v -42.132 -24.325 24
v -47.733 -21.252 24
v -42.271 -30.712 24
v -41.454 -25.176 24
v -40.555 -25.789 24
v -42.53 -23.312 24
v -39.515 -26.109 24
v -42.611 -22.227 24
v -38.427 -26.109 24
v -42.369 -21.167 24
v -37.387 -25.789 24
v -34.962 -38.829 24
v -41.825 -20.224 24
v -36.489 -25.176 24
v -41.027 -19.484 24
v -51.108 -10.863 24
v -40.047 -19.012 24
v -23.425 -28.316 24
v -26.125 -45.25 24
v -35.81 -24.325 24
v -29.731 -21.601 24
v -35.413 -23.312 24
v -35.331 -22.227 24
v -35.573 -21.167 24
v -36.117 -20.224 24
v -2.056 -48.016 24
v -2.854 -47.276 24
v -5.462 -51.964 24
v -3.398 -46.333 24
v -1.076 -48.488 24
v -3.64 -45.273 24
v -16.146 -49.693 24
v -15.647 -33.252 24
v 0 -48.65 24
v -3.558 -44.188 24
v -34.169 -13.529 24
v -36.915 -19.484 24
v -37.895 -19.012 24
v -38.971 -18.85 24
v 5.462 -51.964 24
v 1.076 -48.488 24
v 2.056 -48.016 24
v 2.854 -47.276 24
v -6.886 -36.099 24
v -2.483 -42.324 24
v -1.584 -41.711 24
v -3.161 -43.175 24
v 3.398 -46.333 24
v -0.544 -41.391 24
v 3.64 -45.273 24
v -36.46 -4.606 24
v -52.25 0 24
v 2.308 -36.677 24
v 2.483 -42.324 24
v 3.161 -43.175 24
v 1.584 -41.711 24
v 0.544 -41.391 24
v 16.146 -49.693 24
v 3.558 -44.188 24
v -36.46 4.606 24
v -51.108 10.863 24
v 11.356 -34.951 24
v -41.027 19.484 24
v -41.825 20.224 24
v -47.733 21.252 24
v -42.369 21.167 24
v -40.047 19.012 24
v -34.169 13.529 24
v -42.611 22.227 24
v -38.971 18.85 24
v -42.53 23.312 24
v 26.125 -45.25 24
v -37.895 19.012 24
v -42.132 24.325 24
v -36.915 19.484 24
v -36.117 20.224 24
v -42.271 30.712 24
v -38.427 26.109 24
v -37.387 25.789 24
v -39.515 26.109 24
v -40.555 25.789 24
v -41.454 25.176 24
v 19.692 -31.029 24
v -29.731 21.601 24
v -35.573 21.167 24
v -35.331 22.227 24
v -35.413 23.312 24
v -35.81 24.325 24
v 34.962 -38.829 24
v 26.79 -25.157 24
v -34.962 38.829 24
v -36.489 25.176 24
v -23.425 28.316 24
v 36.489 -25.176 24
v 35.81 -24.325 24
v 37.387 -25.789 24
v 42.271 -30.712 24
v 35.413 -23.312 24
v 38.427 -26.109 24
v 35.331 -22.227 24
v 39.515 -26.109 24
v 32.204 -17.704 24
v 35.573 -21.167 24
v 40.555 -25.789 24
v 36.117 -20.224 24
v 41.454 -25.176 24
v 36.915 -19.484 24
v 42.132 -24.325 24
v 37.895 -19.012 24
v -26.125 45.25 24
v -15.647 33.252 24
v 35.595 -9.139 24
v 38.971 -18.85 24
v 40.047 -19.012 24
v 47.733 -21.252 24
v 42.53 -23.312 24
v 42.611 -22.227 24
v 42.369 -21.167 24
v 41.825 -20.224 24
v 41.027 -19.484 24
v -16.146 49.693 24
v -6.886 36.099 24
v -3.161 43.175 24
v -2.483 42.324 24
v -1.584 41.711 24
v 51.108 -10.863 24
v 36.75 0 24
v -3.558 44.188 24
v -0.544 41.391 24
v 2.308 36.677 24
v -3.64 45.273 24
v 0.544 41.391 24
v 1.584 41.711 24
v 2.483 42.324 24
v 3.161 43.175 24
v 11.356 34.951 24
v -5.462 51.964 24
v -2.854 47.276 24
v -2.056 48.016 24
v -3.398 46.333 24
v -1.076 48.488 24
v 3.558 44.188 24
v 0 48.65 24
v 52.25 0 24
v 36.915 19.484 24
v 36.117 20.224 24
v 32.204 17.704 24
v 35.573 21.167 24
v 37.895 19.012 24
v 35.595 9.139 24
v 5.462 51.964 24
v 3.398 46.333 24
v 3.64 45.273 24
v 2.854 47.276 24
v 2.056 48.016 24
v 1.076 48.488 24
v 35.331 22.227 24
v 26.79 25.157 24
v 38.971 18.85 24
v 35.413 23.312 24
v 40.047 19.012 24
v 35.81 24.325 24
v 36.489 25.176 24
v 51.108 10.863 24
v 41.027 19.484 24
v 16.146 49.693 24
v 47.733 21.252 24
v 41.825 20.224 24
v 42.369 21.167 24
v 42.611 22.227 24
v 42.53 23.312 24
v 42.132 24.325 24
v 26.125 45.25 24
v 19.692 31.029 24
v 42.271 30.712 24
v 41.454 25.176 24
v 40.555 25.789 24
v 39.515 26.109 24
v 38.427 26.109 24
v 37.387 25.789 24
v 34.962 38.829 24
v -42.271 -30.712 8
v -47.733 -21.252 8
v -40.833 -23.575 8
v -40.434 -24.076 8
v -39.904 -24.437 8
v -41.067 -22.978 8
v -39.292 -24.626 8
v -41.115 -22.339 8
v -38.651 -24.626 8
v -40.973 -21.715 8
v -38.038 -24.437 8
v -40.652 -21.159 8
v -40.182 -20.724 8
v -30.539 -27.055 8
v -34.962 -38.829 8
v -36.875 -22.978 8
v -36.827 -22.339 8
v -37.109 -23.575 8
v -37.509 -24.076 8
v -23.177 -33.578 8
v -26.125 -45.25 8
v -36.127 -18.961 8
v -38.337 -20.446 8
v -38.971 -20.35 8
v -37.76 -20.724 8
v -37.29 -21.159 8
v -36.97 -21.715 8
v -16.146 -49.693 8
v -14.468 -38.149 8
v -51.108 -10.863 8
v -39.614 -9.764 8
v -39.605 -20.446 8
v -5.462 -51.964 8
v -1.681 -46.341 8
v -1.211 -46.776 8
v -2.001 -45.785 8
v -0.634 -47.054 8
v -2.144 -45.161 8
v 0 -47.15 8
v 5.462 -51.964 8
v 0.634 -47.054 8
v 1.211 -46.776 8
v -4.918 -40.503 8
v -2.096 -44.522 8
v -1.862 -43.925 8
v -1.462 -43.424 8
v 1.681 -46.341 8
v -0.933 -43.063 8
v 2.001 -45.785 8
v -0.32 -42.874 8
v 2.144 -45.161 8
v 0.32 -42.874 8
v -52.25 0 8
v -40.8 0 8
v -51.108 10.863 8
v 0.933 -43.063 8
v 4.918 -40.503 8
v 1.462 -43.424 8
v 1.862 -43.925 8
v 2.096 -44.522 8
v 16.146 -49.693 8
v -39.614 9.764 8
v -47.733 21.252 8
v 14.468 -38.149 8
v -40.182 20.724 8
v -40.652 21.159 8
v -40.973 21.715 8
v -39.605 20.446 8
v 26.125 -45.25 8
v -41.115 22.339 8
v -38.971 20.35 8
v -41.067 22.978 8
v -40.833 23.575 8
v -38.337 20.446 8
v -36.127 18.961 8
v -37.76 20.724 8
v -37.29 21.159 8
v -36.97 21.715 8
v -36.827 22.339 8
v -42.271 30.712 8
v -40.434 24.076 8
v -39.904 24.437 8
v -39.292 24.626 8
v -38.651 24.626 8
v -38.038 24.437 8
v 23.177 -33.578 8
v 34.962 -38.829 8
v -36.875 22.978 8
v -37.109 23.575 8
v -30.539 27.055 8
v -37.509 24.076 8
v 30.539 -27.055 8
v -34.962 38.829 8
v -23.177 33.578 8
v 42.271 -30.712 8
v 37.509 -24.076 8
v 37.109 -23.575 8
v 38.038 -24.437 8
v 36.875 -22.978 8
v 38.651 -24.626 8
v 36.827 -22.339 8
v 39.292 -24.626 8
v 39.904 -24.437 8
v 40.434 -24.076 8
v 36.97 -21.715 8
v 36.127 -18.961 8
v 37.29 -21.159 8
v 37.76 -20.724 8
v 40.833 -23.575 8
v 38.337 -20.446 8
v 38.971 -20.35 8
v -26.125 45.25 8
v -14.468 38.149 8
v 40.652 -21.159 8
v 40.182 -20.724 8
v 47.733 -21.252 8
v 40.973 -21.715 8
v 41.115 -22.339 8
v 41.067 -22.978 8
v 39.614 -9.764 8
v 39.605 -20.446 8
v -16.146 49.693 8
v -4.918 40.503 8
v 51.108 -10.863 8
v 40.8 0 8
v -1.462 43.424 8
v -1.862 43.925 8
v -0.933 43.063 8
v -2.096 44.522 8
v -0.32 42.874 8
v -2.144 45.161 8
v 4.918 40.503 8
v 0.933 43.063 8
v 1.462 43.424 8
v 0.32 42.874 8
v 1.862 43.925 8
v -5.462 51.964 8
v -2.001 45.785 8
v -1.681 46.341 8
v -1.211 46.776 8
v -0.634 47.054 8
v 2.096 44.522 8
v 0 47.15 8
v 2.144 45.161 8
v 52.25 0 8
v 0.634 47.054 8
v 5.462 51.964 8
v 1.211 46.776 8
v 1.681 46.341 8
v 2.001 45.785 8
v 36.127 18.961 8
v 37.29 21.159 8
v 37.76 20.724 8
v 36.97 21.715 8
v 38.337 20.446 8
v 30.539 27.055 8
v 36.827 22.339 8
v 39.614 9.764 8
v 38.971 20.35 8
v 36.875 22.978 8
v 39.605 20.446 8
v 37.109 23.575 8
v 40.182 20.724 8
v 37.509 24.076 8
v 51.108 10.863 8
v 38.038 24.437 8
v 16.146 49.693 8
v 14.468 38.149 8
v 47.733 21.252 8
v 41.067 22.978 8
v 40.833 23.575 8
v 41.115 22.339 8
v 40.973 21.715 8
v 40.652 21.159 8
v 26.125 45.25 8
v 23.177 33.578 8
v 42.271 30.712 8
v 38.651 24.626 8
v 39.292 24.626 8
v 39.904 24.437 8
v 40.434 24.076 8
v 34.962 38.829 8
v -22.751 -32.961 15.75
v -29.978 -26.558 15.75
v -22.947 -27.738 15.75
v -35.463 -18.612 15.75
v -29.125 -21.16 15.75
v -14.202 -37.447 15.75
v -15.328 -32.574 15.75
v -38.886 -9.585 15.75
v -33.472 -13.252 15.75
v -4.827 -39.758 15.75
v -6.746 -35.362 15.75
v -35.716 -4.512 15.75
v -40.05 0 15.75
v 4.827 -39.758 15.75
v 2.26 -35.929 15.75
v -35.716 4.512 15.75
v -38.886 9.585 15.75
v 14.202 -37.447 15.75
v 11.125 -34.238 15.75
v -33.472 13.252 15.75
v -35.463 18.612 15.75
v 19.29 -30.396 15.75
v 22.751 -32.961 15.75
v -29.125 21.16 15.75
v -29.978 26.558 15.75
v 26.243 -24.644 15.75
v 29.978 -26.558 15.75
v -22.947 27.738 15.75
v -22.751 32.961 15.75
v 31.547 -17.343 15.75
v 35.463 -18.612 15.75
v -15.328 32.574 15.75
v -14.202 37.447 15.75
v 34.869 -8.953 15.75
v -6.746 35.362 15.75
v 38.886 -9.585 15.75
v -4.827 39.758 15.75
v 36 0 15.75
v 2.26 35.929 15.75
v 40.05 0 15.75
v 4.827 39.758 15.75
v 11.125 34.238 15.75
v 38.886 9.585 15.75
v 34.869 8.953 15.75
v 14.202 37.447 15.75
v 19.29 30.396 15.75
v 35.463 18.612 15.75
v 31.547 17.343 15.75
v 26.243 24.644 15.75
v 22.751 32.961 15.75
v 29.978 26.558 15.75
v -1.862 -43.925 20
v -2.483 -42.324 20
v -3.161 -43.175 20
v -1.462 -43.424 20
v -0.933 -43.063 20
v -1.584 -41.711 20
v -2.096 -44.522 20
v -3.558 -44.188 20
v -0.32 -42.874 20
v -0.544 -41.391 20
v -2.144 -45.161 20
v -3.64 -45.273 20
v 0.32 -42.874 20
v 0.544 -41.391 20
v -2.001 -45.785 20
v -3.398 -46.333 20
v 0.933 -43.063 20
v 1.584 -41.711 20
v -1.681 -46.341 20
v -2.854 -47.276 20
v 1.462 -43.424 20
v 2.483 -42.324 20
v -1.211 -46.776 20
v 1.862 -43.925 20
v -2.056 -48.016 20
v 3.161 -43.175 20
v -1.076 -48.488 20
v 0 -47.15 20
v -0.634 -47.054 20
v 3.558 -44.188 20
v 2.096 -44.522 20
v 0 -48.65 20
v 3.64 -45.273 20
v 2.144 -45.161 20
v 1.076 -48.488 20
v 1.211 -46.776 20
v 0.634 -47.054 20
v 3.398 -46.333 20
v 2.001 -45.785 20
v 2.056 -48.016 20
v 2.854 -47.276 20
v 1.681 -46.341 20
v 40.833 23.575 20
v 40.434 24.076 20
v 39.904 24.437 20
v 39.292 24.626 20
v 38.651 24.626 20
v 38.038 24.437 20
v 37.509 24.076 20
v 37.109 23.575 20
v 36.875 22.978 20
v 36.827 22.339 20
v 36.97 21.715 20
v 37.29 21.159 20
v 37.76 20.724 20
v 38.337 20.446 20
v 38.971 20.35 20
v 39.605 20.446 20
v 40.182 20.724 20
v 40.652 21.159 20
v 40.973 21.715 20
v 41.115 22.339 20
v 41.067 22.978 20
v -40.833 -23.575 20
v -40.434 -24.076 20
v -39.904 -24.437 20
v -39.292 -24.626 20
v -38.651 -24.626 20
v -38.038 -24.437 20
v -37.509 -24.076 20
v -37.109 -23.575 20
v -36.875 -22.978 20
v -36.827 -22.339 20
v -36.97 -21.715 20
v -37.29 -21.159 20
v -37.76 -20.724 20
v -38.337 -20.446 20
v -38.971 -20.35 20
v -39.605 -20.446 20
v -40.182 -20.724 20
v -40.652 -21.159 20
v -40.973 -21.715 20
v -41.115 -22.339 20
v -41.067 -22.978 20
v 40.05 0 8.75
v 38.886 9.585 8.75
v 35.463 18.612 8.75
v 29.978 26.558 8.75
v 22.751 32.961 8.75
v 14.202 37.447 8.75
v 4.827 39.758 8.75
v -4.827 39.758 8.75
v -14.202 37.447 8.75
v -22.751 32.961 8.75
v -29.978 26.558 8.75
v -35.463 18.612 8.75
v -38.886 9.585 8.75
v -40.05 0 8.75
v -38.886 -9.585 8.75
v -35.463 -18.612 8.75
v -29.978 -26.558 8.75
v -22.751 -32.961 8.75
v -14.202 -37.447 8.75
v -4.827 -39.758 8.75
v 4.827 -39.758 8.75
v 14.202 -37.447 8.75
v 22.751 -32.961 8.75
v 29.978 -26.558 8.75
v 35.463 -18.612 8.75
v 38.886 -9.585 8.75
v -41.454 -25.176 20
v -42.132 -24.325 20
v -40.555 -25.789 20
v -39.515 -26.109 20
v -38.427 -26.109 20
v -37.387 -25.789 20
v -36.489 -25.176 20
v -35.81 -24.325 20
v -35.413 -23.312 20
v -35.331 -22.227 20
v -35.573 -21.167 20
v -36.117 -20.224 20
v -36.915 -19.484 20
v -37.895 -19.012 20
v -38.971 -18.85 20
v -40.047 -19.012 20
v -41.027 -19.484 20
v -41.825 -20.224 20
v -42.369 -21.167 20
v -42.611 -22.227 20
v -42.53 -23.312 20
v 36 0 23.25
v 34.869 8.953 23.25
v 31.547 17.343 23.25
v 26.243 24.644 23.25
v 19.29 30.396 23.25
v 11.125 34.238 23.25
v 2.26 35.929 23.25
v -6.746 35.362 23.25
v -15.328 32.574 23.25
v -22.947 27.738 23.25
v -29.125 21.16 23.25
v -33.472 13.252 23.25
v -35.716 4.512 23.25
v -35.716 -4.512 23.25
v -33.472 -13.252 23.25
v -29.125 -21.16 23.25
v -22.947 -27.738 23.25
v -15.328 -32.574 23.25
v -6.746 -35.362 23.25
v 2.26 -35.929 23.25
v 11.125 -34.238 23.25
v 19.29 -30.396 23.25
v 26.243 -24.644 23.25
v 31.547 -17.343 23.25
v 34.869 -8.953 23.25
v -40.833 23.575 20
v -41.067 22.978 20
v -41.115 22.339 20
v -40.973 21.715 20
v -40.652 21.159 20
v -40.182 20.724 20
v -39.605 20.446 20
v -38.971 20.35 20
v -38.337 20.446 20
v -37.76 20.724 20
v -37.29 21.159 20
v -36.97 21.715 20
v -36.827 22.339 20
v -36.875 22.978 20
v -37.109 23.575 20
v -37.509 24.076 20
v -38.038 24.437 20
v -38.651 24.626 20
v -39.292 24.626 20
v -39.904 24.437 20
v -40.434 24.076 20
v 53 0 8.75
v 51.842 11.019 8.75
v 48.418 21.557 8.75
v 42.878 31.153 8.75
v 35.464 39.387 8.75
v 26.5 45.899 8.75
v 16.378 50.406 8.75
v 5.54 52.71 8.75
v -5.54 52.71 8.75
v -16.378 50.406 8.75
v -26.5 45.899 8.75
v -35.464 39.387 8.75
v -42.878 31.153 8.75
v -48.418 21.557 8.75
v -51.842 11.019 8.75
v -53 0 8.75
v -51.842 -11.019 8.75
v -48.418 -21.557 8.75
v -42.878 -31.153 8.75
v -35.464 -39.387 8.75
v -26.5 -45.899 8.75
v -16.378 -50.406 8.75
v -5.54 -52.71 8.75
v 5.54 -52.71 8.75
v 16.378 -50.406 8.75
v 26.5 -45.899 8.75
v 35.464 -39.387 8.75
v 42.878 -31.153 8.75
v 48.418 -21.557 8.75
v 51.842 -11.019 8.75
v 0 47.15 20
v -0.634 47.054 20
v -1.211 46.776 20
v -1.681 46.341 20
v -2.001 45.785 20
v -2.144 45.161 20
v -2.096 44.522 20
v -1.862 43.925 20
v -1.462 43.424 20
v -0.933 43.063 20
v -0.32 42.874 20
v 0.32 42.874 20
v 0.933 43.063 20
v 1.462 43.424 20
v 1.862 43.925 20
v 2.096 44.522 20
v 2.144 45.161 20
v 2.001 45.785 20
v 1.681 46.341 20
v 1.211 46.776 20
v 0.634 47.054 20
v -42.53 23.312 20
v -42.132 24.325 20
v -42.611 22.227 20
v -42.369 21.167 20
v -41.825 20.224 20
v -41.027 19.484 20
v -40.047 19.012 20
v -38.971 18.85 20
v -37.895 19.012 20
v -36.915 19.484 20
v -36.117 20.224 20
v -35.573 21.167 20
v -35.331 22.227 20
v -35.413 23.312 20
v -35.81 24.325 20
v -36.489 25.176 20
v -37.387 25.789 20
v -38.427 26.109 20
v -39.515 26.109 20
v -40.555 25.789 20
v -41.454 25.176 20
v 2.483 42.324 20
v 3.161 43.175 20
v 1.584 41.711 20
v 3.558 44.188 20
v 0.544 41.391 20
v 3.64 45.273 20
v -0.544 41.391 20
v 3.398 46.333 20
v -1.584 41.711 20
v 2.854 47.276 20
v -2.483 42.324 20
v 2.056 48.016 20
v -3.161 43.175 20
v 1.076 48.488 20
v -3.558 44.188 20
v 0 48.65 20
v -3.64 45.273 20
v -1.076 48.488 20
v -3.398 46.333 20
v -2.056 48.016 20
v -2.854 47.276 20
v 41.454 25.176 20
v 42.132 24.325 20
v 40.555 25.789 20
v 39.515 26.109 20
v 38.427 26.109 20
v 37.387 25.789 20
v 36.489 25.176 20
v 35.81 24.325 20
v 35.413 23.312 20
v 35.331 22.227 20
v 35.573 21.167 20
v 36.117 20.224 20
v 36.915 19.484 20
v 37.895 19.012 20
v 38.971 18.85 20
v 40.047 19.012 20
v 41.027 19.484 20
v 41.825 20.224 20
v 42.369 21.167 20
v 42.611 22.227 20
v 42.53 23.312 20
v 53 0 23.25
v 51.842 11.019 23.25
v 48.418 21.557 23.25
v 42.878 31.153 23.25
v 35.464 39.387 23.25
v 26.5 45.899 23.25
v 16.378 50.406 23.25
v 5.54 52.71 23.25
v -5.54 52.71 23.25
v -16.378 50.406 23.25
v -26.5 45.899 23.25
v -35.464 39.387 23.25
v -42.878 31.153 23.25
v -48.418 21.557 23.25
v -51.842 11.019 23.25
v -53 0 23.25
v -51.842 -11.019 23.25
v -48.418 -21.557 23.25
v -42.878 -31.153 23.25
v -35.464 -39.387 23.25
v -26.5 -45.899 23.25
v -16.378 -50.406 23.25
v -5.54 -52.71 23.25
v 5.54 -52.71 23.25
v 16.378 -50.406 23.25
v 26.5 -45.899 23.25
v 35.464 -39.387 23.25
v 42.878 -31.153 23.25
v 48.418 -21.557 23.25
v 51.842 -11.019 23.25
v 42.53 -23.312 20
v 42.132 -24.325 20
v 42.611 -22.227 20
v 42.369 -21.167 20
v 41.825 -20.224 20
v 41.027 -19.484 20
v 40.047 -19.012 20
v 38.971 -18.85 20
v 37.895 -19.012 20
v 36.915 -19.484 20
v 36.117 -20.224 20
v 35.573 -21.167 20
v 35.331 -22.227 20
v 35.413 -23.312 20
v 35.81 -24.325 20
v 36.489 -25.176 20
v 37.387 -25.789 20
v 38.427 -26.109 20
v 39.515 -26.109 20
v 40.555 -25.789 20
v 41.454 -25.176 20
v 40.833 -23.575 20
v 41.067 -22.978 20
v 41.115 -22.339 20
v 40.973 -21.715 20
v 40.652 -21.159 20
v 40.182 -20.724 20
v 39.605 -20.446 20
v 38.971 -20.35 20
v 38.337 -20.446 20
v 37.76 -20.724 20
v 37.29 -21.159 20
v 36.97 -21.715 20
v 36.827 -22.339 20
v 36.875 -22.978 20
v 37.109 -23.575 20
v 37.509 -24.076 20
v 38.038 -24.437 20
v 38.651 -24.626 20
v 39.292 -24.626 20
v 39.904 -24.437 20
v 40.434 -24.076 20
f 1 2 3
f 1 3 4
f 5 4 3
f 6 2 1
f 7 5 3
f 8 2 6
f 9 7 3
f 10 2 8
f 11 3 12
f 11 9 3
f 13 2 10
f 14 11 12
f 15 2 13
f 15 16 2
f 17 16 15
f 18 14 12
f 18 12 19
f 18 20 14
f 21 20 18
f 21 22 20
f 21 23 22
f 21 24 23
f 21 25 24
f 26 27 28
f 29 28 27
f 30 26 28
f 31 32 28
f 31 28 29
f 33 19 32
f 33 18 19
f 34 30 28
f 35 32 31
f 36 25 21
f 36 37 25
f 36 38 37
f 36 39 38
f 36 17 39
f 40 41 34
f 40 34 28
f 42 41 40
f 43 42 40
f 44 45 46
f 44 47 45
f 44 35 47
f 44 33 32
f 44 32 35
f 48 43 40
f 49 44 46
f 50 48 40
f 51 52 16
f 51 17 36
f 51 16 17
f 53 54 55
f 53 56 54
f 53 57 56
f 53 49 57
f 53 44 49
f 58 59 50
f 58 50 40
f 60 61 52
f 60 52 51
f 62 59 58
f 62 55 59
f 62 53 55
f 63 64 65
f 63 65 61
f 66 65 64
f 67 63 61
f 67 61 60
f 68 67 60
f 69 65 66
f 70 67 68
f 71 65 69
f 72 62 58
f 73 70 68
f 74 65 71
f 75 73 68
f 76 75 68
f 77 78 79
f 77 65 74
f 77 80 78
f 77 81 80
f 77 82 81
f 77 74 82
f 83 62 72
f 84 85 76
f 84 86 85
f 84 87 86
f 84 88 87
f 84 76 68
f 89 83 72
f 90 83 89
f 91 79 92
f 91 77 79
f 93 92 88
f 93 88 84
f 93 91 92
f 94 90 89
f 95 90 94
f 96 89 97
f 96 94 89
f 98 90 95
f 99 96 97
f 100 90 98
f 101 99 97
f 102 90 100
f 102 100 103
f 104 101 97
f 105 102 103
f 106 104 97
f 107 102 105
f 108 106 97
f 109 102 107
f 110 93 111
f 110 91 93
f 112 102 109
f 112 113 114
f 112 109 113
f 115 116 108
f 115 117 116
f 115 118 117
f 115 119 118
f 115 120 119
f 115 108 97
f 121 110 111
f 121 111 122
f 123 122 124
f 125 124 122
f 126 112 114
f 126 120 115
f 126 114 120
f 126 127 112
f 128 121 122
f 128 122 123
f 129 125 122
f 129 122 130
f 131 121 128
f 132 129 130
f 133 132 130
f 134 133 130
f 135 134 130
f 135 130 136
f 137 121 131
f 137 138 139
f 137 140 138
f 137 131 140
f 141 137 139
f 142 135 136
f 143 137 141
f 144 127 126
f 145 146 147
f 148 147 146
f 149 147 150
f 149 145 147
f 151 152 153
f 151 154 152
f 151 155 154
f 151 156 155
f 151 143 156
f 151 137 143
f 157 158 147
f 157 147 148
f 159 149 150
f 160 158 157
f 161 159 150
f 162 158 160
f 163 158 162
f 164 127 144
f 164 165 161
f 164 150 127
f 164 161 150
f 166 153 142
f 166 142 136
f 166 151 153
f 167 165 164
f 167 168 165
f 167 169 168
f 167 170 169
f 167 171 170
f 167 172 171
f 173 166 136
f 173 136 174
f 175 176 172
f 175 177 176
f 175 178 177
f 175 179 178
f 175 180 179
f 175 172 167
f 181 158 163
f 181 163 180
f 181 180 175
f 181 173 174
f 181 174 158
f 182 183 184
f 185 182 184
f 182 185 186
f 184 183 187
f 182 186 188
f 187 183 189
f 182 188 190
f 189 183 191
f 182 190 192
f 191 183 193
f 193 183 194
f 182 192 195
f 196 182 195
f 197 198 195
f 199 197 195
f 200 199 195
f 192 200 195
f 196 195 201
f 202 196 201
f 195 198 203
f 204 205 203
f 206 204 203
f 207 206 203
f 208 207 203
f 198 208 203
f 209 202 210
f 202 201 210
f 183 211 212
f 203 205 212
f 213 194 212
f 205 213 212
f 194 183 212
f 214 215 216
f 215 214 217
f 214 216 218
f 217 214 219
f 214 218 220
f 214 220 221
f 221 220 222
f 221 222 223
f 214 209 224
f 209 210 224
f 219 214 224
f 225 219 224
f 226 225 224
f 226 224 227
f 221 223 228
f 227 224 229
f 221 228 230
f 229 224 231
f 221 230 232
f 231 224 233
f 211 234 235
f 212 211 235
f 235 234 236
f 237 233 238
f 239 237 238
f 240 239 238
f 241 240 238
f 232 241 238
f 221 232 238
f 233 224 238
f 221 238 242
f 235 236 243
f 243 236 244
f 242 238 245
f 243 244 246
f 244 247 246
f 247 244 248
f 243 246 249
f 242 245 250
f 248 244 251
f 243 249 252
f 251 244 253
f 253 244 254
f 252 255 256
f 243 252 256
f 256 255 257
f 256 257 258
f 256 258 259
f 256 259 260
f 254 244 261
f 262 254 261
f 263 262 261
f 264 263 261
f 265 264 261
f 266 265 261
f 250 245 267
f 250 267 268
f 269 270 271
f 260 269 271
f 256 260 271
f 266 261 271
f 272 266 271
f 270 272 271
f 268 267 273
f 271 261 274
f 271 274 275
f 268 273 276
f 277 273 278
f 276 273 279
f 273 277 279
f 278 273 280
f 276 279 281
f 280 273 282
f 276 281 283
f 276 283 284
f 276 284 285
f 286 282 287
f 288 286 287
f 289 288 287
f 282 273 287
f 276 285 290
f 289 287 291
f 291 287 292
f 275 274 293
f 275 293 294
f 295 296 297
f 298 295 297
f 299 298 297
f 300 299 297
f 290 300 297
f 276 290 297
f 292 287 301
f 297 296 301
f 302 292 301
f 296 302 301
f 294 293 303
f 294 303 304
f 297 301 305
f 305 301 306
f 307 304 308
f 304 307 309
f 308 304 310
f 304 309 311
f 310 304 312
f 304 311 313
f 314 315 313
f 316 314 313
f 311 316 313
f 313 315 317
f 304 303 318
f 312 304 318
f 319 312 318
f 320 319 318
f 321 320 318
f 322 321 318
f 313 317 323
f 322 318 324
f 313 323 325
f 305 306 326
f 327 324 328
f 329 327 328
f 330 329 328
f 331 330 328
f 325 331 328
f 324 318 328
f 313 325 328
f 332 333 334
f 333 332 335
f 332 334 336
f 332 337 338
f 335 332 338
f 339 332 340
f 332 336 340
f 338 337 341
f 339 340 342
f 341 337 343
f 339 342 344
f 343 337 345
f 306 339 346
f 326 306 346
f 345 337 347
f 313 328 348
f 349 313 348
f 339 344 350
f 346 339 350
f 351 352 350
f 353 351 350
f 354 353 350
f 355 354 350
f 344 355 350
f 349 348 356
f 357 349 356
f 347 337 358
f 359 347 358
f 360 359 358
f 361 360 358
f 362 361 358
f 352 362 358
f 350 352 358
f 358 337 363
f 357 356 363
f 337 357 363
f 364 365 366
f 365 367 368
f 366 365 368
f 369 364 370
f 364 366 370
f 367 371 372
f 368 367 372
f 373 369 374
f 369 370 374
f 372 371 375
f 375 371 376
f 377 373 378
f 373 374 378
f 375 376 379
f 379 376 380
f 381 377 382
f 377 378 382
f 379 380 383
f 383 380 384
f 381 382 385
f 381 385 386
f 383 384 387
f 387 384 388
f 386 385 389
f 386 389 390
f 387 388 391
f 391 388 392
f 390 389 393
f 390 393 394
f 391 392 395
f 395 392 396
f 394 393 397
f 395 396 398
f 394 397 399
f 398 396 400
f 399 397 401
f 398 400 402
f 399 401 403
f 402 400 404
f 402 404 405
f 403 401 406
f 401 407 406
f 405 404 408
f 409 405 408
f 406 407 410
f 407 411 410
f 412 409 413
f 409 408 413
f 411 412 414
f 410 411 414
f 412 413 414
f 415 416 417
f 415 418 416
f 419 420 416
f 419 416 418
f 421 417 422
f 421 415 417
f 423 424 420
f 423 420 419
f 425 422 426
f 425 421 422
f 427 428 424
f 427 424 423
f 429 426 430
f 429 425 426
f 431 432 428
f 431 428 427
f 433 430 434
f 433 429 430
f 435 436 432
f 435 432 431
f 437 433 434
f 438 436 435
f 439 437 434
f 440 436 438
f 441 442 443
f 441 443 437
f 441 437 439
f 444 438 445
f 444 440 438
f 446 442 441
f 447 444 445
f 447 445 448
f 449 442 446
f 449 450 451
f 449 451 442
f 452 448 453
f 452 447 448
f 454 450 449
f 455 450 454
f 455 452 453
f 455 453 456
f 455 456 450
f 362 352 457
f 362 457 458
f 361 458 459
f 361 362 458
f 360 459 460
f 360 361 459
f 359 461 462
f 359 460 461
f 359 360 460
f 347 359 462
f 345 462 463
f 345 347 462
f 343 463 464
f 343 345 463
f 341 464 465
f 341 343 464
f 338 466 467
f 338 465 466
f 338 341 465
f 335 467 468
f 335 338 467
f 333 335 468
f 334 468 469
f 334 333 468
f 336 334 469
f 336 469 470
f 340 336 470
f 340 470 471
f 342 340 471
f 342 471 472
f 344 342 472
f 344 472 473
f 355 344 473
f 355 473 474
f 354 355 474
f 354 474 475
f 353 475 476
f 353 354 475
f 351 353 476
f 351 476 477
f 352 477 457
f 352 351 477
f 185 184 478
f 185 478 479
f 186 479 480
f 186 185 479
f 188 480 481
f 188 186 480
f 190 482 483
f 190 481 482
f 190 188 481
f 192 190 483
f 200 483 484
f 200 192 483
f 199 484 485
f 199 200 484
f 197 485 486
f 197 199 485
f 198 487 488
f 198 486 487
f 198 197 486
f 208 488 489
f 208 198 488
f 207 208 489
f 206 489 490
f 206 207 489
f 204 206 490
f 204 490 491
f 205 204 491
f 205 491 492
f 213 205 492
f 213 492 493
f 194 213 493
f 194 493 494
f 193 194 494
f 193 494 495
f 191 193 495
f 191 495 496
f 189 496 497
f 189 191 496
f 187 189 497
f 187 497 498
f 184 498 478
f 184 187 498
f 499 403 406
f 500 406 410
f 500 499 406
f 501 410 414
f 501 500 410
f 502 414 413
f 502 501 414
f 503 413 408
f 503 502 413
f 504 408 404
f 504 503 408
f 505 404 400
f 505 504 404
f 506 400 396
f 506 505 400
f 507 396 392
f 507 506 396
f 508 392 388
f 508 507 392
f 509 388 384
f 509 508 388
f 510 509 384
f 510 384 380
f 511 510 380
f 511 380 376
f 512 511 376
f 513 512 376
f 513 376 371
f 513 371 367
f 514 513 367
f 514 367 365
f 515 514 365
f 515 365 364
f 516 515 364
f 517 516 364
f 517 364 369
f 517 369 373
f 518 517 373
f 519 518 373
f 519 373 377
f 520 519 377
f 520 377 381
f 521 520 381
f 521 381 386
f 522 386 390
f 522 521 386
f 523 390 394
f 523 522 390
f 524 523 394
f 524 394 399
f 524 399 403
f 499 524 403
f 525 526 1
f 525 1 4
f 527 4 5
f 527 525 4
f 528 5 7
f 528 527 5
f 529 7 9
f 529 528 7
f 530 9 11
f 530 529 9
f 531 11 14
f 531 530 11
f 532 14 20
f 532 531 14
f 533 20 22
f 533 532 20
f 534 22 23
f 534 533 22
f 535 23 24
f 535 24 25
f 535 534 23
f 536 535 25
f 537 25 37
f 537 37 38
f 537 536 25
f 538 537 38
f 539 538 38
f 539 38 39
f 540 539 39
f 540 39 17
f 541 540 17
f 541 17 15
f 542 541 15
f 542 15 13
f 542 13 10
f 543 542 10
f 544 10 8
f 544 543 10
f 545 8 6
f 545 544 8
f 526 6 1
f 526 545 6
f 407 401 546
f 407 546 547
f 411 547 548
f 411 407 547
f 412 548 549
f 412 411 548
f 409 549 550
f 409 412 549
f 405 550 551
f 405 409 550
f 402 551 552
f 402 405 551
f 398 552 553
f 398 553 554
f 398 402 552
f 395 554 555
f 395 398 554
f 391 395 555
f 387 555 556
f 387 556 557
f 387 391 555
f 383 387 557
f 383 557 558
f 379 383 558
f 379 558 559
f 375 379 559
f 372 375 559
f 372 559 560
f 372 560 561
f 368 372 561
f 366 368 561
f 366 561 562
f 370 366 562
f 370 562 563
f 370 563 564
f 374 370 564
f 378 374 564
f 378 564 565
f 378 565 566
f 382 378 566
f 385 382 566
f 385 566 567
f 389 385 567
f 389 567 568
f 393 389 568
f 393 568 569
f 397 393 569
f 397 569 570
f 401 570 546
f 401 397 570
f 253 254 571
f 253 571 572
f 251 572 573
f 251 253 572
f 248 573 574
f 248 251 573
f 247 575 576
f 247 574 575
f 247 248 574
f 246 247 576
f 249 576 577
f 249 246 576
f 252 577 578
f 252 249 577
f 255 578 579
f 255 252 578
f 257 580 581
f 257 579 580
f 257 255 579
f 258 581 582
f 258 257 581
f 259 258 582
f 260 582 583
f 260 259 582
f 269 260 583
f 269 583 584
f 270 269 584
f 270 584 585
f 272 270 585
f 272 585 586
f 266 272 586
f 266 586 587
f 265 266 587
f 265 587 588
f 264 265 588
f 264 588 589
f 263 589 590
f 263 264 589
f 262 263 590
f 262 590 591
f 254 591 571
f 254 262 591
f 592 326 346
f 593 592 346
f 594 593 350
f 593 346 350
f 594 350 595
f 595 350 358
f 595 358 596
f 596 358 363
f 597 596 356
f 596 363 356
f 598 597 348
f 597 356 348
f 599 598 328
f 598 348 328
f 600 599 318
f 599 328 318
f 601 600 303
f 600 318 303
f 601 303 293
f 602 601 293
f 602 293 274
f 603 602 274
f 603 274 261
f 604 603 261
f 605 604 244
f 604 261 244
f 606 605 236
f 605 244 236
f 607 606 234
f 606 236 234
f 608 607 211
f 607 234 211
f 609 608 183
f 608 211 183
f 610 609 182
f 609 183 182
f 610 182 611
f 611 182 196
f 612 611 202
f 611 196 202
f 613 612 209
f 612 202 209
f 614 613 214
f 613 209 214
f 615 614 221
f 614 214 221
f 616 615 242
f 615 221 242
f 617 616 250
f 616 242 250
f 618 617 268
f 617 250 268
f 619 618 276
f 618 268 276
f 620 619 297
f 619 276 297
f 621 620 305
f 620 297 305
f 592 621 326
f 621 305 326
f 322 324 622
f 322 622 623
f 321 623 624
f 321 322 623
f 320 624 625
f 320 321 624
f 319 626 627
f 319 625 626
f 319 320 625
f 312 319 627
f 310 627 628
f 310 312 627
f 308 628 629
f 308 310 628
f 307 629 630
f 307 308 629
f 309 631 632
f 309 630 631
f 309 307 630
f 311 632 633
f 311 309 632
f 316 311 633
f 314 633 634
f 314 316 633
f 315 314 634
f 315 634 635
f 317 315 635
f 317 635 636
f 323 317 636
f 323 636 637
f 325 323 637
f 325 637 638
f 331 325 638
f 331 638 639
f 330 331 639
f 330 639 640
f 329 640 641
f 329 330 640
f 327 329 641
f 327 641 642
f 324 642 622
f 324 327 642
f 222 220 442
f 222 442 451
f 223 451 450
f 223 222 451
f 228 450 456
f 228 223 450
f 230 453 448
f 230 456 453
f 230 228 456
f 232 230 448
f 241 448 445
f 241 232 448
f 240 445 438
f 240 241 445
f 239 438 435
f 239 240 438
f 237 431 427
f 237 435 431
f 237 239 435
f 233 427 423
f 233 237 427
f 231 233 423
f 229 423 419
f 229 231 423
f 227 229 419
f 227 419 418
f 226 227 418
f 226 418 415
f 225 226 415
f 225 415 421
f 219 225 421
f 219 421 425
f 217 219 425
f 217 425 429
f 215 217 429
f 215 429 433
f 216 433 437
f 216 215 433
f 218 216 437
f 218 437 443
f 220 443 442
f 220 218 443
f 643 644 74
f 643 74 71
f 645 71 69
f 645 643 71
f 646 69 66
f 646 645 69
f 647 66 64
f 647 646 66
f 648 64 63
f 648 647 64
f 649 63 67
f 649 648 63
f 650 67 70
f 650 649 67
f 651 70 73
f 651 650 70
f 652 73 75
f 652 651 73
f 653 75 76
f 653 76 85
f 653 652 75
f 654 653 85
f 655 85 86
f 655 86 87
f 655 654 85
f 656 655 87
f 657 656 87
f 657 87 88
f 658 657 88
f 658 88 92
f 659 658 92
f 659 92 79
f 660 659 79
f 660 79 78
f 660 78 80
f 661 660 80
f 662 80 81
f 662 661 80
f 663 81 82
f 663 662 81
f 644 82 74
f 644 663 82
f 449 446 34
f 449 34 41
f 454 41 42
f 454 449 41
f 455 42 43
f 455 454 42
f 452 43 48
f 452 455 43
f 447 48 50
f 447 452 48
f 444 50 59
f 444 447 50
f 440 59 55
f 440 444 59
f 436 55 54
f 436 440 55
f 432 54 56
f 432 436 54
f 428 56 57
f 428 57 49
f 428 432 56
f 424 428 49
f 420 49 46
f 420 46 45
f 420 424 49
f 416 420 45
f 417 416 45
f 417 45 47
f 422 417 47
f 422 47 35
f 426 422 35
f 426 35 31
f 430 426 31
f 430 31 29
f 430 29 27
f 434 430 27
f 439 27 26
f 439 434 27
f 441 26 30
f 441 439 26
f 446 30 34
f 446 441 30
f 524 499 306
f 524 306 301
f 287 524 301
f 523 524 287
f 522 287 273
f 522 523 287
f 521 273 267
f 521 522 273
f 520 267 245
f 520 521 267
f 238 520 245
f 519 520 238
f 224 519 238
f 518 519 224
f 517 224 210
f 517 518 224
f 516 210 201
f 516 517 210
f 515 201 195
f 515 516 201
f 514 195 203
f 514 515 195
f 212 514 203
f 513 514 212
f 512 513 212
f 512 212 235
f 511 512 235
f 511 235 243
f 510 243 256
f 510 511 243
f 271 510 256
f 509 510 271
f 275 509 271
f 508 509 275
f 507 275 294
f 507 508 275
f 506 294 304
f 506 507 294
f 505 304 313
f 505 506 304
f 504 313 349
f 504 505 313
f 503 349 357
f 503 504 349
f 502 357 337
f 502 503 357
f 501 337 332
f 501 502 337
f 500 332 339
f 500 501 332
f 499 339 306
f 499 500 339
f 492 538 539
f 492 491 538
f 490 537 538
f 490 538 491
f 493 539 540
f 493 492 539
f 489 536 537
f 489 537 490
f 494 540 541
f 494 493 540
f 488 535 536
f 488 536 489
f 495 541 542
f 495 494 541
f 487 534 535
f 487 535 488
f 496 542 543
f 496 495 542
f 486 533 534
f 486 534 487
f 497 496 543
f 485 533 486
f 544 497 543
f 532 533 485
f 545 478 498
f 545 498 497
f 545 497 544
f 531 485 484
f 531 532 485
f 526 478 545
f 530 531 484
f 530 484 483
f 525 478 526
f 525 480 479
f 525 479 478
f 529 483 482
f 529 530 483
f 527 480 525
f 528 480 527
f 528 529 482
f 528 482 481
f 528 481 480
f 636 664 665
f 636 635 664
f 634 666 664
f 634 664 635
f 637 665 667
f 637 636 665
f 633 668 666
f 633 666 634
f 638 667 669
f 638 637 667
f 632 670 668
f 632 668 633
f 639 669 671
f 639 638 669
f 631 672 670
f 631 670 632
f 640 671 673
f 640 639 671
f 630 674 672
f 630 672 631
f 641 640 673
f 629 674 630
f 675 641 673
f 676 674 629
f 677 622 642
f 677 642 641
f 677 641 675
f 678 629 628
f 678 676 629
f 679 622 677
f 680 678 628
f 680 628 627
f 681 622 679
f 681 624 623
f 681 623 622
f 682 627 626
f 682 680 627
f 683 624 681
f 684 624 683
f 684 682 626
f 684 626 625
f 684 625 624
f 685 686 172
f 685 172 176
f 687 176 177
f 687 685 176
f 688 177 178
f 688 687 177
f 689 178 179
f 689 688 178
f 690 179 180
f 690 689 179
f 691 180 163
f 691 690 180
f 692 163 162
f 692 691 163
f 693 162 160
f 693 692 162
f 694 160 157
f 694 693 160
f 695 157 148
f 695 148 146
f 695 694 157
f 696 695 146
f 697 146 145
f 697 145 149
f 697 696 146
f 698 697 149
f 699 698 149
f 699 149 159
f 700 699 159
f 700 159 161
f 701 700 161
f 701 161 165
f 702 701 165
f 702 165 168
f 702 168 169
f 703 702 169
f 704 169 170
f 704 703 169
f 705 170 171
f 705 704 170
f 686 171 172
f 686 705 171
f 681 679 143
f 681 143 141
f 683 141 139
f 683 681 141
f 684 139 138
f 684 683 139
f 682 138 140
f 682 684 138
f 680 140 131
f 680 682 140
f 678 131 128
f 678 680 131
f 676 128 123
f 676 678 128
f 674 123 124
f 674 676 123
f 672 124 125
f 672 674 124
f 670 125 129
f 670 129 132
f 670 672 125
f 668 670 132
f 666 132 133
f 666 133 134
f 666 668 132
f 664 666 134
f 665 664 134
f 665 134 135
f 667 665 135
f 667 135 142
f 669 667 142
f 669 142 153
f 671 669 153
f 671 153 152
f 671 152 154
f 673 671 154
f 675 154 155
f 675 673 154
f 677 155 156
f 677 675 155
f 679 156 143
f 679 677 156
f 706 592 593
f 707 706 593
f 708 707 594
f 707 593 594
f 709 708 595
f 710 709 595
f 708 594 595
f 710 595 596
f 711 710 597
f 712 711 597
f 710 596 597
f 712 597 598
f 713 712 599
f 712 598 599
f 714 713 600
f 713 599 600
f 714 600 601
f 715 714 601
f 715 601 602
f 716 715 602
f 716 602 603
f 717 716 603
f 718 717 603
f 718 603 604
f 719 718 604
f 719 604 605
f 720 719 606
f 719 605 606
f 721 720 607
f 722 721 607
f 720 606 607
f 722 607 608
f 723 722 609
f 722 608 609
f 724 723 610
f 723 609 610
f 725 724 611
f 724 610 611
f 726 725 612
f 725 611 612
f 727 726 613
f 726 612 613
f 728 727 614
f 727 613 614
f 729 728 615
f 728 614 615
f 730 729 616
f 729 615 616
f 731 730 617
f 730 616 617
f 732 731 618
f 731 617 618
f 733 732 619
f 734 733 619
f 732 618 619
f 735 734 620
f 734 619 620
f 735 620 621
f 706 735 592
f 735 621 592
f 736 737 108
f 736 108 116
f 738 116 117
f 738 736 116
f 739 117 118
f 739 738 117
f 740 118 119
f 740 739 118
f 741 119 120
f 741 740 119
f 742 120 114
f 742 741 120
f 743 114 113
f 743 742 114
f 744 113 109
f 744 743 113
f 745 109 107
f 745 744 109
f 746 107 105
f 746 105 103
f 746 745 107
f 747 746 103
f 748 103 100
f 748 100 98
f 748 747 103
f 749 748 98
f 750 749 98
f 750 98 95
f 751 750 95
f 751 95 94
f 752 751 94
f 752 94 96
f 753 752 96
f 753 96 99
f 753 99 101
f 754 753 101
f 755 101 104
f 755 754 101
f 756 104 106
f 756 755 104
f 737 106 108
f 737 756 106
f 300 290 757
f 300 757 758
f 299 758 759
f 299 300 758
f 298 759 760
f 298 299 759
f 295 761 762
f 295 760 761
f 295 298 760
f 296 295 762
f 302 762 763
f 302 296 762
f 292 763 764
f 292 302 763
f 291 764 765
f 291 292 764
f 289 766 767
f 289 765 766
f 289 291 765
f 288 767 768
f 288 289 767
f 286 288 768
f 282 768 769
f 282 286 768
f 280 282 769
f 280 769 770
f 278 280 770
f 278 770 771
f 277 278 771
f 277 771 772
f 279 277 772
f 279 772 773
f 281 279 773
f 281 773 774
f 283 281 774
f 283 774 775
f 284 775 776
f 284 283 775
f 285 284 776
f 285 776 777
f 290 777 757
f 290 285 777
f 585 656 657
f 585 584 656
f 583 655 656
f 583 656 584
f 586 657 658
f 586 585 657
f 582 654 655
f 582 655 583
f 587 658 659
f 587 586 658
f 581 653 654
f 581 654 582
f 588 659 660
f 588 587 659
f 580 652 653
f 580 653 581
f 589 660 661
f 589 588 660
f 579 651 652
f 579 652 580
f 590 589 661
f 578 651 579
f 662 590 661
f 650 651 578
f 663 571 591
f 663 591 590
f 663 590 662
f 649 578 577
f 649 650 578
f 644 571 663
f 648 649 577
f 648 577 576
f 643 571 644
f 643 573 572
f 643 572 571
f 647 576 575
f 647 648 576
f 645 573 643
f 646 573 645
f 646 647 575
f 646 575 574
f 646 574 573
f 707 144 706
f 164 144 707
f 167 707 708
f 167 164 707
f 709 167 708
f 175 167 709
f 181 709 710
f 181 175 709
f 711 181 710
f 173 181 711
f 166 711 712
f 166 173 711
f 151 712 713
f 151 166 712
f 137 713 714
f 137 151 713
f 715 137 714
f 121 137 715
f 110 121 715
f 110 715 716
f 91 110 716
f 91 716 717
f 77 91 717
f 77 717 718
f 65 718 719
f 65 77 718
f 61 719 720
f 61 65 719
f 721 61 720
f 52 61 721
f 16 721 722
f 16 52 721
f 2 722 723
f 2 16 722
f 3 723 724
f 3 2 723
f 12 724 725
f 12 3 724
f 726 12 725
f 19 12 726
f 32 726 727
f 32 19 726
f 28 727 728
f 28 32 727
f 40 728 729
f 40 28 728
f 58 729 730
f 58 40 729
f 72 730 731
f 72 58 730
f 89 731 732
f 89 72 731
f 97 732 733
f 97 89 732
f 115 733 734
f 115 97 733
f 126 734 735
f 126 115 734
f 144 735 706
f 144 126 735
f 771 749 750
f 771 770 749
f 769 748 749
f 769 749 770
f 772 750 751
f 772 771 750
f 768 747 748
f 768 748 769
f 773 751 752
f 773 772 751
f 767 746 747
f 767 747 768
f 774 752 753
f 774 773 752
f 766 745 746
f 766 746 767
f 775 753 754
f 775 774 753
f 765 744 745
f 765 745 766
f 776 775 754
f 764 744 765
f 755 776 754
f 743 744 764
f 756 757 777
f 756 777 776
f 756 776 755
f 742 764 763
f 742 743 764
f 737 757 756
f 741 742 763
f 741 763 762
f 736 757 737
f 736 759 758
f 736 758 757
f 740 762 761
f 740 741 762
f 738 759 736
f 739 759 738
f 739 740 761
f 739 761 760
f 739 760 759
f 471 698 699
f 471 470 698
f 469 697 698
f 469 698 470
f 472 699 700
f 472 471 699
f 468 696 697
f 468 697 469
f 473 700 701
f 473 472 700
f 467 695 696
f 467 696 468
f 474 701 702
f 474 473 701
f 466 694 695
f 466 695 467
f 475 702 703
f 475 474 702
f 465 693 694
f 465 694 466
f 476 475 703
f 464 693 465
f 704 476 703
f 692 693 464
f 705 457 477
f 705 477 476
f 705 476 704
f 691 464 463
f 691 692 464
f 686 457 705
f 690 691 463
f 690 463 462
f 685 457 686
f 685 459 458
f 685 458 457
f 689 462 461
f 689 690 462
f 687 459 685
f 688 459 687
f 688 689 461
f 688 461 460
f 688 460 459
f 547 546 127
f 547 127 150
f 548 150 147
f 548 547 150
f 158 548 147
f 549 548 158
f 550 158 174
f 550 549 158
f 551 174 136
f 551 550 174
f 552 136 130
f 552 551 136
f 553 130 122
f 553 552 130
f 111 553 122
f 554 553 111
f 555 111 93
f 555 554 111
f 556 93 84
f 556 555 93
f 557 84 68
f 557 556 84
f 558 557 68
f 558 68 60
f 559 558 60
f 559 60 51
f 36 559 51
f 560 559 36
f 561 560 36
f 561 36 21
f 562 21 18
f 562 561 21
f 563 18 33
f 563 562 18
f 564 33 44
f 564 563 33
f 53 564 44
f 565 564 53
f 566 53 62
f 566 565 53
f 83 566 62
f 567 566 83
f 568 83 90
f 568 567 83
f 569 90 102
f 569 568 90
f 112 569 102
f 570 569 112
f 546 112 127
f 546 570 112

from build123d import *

# Parameters (mm, degrees)
CYLINDER014005880_R                            = 40.05
CYLINDER014005880_DEPTH                        = 16
CYLINDER014005882_R                            = 3.65
CYLINDER014005882_DEPTH                        = 4
CYLINDER014005881_R                            = 2.15
CYLINDER014005881_DEPTH                        = 24
FUSION001089102007007003008015_PLACEMENT_ANGLE = 60
FUSION001089102007007003008011_PLACEMENT_ANGLE = 120
FUSION001089102007007003008009_PLACEMENT_ANGLE = 180
FUSION001089102007007003008012_PLACEMENT_ANGLE = 240
FUSION001089102007007003008014_PLACEMENT_ANGLE = 60
FUSION001089102007007003008010_PLACEMENT_ANGLE = 30
CYLINDER014005879_R                            = 36
CYLINDER014005879_DEPTH                        = 16
CYLINDER014005878_R                            = 53
CYLINDER014005878_DEPTH                        = 16
CHAMFER013_SIZE                                = 0.75


with BuildPart() as v_lec790:
    # Cylinder014005880 → Cylinder014005880 (new body)
    with BuildSketch(Plane.XY.offset(-0.25)):
        Circle(CYLINDER014005880_R)
    extrude(amount=CYLINDER014005880_DEPTH)


with BuildPart() as v_lec792:
    # Cylinder014005882 → Cylinder014005882 (new body)
    with BuildSketch(Plane(origin=(45, 0, 4), x_dir=(1, 0, 0), z_dir=(0, 0, 1))):
        Circle(CYLINDER014005882_R)
    extrude(amount=CYLINDER014005882_DEPTH)


with BuildPart() as inbusl010:
    # Cylinder014005881 → Cylinder014005881 (new body)
    with BuildSketch(Plane(origin=(45, 0, -16), x_dir=(1, 0, 0), z_dir=(0, 0, 1))):
        Circle(CYLINDER014005881_R)
    extrude(amount=CYLINDER014005881_DEPTH)

    # Fusion001089102007007003008013: union Válec792
    add(v_lec792.part)


with BuildPart() as inbusl012:
    # Fusion001089102007007003008015 base: copy of inbusL010
    add(inbusl010.part)


with BuildPart() as inbusl012_1:
    # Fusion001089102007007003008015 placement: moved
    add(inbusl012.part.rotate(Axis((0, 0, 0), (0, 0, 1)), FUSION001089102007007003008015_PLACEMENT_ANGLE))


with BuildPart() as inbusl008:
    # Fusion001089102007007003008011 base: copy of inbusL010
    add(inbusl010.part)


with BuildPart() as inbusl008_1:
    # Fusion001089102007007003008011 placement: moved
    add(inbusl008.part.rotate(Axis((0, 0, 0), (0, 0, 1)), FUSION001089102007007003008011_PLACEMENT_ANGLE))


with BuildPart() as inbusl007:
    # Fusion001089102007007003008009 base: copy of inbusL010
    add(inbusl010.part)


with BuildPart() as inbusl007_1:
    # Fusion001089102007007003008009 placement: moved
    add(inbusl007.part.rotate(Axis((0, 0, 0), (0, 0, 1)), FUSION001089102007007003008009_PLACEMENT_ANGLE))


with BuildPart() as inbusl009:
    # Fusion001089102007007003008012 base: copy of inbusL010
    add(inbusl010.part)


with BuildPart() as inbusl009_1:
    # Fusion001089102007007003008012 placement: moved
    add(inbusl009.part.rotate(Axis((0, 0, 0), (0, 0, 1)), FUSION001089102007007003008012_PLACEMENT_ANGLE))


with BuildPart() as inbusl011:
    # Fusion001089102007007003008014 base: copy of inbusL010
    add(inbusl010.part)


with BuildPart() as inbusl011_1:
    # Fusion001089102007007003008014 placement: moved
    add(inbusl011.part.rotate(Axis((0, 0, 0), (0, 0, -1)), FUSION001089102007007003008014_PLACEMENT_ANGLE))


with BuildPart() as fusion001089102007007003008010:
    # Fusion001089102007007003008010 base: copy of inbusL010
    add(inbusl010.part)

    # Fusion001089102007007003008010: union inbusL012, inbusL008, inbusL007, inbusL009, inbusL011
    add(inbusl012_1.part)
    add(inbusl008_1.part)
    add(inbusl007_1.part)
    add(inbusl009_1.part)
    add(inbusl011_1.part)


with BuildPart() as fusion001089102007007003008010_1:
    # Fusion001089102007007003008010 placement: moved
    add(fusion001089102007007003008010.part.moved(Location((0, 0, 16))).rotate(Axis((0, 0, 16), (0, 0, 1)), FUSION001089102007007003008010_PLACEMENT_ANGLE))


with BuildPart() as fusion001089102007007003008016:
    # Cylinder014005879 → Cylinder014005879 (new body)
    with BuildSketch(Plane.XY.offset(8)):
        Circle(CYLINDER014005879_R)
    extrude(amount=CYLINDER014005879_DEPTH)

    # Fusion001089102007007003008016: union Válec790, Fusion001089102007007003008010
    add(v_lec790.part)
    add(fusion001089102007007003008010_1.part)


with BuildPart() as outputd:
    # Cylinder014005878 → Cylinder014005878 (new body)
    with BuildSketch(Plane.XY.offset(8)):
        Circle(CYLINDER014005878_R)
    extrude(amount=CYLINDER014005878_DEPTH)

    # Cut009003003009003002: cut Fusion001089102007007003008016
    add(fusion001089102007007003008016.part, mode=Mode.SUBTRACT)

    # Chamfer013
    chamfer013_edges = [outputd.edges().sort_by_distance(p)[0] for p in [
        (-53, 0, 24),
        (-53, 0, 8),
        (-36, 0, 24),
        (-40.05, 0, 8),
    ]]
    chamfer(chamfer013_edges, length=CHAMFER013_SIZE)


solid = outputd.part
